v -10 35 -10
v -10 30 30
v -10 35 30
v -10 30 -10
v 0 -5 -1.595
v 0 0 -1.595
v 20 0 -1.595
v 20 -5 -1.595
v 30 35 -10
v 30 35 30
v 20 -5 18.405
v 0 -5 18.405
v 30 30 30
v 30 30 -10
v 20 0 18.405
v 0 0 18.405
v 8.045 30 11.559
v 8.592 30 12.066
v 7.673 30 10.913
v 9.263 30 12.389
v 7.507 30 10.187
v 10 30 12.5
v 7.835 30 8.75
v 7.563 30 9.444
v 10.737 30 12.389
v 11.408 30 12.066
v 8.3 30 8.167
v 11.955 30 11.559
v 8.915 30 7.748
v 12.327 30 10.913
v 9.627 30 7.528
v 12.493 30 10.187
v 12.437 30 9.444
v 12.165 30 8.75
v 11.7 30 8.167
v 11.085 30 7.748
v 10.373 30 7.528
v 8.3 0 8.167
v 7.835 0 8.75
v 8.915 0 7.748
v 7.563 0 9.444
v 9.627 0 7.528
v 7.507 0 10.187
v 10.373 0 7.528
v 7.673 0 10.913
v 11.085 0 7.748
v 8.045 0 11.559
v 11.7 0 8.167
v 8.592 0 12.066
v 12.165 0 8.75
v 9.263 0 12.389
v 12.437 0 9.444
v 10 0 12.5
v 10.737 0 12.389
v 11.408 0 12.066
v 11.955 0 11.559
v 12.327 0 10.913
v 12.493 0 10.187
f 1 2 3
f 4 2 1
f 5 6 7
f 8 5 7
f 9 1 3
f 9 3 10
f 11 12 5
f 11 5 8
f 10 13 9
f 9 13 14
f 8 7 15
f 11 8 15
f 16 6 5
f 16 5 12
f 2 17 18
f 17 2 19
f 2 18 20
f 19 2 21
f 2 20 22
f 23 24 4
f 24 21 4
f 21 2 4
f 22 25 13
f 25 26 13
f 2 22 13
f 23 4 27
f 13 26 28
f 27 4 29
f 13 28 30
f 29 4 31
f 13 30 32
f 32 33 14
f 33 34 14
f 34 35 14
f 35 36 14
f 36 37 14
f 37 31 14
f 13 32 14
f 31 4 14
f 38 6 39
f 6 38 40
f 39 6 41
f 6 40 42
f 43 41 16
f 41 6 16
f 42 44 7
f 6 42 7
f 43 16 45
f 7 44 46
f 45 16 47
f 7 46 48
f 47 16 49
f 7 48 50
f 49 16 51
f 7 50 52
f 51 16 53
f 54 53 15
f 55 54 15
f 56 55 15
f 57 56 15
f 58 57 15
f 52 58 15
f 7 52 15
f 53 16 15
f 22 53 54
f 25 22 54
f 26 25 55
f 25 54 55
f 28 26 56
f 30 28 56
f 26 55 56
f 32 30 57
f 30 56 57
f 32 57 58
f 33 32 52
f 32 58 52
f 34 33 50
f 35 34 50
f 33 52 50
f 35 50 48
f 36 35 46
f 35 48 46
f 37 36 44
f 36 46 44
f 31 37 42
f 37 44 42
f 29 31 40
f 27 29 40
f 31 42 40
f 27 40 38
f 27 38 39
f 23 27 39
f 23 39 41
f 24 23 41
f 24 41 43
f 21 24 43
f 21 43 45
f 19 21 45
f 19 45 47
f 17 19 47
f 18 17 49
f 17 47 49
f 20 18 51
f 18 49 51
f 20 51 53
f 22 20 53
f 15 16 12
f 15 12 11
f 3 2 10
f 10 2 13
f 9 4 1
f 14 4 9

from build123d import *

# Parameters (mm, degrees)
SKETCH1_R           = 2.5
BOSS_EXTRUDE3_DEPTH = 30
SKETCH4_W           = 40
SKETCH4_H           = 40
BOSS_EXTRUDE5_DEPTH = 5
SKETCH5_W           = 20
SKETCH5_H           = 20
BOSS_EXTRUDE6_DEPTH = 5


with BuildPart() as part:
    # Sketch1 → Boss-Extrude3 (new body)
    with BuildSketch(Plane(origin=(0, 0, 0), x_dir=(1, 0, 0), z_dir=(0, 1, 0))):
        with Locations(Location((10, -10, 0), (0, 0, 270))):  # turned: the seam where the file's is
            Circle(SKETCH1_R)
    extrude(amount=BOSS_EXTRUDE3_DEPTH)

    # Sketch4 → Boss-Extrude5 (add)
    with BuildSketch(Plane(origin=(0, 30, 0), x_dir=(1, 0, 0), z_dir=(0, 1, 0))):
        with Locations((10, -10)):
            Rectangle(SKETCH4_W, SKETCH4_H)
    extrude(amount=BOSS_EXTRUDE5_DEPTH)

    # Sketch5 → Boss-Extrude6 (add)
    with BuildSketch(Plane.XZ):
        with Locations((10, 8.405143714)):
            Rectangle(SKETCH5_W, SKETCH5_H)
    extrude(amount=BOSS_EXTRUDE6_DEPTH)


solid = part.part
